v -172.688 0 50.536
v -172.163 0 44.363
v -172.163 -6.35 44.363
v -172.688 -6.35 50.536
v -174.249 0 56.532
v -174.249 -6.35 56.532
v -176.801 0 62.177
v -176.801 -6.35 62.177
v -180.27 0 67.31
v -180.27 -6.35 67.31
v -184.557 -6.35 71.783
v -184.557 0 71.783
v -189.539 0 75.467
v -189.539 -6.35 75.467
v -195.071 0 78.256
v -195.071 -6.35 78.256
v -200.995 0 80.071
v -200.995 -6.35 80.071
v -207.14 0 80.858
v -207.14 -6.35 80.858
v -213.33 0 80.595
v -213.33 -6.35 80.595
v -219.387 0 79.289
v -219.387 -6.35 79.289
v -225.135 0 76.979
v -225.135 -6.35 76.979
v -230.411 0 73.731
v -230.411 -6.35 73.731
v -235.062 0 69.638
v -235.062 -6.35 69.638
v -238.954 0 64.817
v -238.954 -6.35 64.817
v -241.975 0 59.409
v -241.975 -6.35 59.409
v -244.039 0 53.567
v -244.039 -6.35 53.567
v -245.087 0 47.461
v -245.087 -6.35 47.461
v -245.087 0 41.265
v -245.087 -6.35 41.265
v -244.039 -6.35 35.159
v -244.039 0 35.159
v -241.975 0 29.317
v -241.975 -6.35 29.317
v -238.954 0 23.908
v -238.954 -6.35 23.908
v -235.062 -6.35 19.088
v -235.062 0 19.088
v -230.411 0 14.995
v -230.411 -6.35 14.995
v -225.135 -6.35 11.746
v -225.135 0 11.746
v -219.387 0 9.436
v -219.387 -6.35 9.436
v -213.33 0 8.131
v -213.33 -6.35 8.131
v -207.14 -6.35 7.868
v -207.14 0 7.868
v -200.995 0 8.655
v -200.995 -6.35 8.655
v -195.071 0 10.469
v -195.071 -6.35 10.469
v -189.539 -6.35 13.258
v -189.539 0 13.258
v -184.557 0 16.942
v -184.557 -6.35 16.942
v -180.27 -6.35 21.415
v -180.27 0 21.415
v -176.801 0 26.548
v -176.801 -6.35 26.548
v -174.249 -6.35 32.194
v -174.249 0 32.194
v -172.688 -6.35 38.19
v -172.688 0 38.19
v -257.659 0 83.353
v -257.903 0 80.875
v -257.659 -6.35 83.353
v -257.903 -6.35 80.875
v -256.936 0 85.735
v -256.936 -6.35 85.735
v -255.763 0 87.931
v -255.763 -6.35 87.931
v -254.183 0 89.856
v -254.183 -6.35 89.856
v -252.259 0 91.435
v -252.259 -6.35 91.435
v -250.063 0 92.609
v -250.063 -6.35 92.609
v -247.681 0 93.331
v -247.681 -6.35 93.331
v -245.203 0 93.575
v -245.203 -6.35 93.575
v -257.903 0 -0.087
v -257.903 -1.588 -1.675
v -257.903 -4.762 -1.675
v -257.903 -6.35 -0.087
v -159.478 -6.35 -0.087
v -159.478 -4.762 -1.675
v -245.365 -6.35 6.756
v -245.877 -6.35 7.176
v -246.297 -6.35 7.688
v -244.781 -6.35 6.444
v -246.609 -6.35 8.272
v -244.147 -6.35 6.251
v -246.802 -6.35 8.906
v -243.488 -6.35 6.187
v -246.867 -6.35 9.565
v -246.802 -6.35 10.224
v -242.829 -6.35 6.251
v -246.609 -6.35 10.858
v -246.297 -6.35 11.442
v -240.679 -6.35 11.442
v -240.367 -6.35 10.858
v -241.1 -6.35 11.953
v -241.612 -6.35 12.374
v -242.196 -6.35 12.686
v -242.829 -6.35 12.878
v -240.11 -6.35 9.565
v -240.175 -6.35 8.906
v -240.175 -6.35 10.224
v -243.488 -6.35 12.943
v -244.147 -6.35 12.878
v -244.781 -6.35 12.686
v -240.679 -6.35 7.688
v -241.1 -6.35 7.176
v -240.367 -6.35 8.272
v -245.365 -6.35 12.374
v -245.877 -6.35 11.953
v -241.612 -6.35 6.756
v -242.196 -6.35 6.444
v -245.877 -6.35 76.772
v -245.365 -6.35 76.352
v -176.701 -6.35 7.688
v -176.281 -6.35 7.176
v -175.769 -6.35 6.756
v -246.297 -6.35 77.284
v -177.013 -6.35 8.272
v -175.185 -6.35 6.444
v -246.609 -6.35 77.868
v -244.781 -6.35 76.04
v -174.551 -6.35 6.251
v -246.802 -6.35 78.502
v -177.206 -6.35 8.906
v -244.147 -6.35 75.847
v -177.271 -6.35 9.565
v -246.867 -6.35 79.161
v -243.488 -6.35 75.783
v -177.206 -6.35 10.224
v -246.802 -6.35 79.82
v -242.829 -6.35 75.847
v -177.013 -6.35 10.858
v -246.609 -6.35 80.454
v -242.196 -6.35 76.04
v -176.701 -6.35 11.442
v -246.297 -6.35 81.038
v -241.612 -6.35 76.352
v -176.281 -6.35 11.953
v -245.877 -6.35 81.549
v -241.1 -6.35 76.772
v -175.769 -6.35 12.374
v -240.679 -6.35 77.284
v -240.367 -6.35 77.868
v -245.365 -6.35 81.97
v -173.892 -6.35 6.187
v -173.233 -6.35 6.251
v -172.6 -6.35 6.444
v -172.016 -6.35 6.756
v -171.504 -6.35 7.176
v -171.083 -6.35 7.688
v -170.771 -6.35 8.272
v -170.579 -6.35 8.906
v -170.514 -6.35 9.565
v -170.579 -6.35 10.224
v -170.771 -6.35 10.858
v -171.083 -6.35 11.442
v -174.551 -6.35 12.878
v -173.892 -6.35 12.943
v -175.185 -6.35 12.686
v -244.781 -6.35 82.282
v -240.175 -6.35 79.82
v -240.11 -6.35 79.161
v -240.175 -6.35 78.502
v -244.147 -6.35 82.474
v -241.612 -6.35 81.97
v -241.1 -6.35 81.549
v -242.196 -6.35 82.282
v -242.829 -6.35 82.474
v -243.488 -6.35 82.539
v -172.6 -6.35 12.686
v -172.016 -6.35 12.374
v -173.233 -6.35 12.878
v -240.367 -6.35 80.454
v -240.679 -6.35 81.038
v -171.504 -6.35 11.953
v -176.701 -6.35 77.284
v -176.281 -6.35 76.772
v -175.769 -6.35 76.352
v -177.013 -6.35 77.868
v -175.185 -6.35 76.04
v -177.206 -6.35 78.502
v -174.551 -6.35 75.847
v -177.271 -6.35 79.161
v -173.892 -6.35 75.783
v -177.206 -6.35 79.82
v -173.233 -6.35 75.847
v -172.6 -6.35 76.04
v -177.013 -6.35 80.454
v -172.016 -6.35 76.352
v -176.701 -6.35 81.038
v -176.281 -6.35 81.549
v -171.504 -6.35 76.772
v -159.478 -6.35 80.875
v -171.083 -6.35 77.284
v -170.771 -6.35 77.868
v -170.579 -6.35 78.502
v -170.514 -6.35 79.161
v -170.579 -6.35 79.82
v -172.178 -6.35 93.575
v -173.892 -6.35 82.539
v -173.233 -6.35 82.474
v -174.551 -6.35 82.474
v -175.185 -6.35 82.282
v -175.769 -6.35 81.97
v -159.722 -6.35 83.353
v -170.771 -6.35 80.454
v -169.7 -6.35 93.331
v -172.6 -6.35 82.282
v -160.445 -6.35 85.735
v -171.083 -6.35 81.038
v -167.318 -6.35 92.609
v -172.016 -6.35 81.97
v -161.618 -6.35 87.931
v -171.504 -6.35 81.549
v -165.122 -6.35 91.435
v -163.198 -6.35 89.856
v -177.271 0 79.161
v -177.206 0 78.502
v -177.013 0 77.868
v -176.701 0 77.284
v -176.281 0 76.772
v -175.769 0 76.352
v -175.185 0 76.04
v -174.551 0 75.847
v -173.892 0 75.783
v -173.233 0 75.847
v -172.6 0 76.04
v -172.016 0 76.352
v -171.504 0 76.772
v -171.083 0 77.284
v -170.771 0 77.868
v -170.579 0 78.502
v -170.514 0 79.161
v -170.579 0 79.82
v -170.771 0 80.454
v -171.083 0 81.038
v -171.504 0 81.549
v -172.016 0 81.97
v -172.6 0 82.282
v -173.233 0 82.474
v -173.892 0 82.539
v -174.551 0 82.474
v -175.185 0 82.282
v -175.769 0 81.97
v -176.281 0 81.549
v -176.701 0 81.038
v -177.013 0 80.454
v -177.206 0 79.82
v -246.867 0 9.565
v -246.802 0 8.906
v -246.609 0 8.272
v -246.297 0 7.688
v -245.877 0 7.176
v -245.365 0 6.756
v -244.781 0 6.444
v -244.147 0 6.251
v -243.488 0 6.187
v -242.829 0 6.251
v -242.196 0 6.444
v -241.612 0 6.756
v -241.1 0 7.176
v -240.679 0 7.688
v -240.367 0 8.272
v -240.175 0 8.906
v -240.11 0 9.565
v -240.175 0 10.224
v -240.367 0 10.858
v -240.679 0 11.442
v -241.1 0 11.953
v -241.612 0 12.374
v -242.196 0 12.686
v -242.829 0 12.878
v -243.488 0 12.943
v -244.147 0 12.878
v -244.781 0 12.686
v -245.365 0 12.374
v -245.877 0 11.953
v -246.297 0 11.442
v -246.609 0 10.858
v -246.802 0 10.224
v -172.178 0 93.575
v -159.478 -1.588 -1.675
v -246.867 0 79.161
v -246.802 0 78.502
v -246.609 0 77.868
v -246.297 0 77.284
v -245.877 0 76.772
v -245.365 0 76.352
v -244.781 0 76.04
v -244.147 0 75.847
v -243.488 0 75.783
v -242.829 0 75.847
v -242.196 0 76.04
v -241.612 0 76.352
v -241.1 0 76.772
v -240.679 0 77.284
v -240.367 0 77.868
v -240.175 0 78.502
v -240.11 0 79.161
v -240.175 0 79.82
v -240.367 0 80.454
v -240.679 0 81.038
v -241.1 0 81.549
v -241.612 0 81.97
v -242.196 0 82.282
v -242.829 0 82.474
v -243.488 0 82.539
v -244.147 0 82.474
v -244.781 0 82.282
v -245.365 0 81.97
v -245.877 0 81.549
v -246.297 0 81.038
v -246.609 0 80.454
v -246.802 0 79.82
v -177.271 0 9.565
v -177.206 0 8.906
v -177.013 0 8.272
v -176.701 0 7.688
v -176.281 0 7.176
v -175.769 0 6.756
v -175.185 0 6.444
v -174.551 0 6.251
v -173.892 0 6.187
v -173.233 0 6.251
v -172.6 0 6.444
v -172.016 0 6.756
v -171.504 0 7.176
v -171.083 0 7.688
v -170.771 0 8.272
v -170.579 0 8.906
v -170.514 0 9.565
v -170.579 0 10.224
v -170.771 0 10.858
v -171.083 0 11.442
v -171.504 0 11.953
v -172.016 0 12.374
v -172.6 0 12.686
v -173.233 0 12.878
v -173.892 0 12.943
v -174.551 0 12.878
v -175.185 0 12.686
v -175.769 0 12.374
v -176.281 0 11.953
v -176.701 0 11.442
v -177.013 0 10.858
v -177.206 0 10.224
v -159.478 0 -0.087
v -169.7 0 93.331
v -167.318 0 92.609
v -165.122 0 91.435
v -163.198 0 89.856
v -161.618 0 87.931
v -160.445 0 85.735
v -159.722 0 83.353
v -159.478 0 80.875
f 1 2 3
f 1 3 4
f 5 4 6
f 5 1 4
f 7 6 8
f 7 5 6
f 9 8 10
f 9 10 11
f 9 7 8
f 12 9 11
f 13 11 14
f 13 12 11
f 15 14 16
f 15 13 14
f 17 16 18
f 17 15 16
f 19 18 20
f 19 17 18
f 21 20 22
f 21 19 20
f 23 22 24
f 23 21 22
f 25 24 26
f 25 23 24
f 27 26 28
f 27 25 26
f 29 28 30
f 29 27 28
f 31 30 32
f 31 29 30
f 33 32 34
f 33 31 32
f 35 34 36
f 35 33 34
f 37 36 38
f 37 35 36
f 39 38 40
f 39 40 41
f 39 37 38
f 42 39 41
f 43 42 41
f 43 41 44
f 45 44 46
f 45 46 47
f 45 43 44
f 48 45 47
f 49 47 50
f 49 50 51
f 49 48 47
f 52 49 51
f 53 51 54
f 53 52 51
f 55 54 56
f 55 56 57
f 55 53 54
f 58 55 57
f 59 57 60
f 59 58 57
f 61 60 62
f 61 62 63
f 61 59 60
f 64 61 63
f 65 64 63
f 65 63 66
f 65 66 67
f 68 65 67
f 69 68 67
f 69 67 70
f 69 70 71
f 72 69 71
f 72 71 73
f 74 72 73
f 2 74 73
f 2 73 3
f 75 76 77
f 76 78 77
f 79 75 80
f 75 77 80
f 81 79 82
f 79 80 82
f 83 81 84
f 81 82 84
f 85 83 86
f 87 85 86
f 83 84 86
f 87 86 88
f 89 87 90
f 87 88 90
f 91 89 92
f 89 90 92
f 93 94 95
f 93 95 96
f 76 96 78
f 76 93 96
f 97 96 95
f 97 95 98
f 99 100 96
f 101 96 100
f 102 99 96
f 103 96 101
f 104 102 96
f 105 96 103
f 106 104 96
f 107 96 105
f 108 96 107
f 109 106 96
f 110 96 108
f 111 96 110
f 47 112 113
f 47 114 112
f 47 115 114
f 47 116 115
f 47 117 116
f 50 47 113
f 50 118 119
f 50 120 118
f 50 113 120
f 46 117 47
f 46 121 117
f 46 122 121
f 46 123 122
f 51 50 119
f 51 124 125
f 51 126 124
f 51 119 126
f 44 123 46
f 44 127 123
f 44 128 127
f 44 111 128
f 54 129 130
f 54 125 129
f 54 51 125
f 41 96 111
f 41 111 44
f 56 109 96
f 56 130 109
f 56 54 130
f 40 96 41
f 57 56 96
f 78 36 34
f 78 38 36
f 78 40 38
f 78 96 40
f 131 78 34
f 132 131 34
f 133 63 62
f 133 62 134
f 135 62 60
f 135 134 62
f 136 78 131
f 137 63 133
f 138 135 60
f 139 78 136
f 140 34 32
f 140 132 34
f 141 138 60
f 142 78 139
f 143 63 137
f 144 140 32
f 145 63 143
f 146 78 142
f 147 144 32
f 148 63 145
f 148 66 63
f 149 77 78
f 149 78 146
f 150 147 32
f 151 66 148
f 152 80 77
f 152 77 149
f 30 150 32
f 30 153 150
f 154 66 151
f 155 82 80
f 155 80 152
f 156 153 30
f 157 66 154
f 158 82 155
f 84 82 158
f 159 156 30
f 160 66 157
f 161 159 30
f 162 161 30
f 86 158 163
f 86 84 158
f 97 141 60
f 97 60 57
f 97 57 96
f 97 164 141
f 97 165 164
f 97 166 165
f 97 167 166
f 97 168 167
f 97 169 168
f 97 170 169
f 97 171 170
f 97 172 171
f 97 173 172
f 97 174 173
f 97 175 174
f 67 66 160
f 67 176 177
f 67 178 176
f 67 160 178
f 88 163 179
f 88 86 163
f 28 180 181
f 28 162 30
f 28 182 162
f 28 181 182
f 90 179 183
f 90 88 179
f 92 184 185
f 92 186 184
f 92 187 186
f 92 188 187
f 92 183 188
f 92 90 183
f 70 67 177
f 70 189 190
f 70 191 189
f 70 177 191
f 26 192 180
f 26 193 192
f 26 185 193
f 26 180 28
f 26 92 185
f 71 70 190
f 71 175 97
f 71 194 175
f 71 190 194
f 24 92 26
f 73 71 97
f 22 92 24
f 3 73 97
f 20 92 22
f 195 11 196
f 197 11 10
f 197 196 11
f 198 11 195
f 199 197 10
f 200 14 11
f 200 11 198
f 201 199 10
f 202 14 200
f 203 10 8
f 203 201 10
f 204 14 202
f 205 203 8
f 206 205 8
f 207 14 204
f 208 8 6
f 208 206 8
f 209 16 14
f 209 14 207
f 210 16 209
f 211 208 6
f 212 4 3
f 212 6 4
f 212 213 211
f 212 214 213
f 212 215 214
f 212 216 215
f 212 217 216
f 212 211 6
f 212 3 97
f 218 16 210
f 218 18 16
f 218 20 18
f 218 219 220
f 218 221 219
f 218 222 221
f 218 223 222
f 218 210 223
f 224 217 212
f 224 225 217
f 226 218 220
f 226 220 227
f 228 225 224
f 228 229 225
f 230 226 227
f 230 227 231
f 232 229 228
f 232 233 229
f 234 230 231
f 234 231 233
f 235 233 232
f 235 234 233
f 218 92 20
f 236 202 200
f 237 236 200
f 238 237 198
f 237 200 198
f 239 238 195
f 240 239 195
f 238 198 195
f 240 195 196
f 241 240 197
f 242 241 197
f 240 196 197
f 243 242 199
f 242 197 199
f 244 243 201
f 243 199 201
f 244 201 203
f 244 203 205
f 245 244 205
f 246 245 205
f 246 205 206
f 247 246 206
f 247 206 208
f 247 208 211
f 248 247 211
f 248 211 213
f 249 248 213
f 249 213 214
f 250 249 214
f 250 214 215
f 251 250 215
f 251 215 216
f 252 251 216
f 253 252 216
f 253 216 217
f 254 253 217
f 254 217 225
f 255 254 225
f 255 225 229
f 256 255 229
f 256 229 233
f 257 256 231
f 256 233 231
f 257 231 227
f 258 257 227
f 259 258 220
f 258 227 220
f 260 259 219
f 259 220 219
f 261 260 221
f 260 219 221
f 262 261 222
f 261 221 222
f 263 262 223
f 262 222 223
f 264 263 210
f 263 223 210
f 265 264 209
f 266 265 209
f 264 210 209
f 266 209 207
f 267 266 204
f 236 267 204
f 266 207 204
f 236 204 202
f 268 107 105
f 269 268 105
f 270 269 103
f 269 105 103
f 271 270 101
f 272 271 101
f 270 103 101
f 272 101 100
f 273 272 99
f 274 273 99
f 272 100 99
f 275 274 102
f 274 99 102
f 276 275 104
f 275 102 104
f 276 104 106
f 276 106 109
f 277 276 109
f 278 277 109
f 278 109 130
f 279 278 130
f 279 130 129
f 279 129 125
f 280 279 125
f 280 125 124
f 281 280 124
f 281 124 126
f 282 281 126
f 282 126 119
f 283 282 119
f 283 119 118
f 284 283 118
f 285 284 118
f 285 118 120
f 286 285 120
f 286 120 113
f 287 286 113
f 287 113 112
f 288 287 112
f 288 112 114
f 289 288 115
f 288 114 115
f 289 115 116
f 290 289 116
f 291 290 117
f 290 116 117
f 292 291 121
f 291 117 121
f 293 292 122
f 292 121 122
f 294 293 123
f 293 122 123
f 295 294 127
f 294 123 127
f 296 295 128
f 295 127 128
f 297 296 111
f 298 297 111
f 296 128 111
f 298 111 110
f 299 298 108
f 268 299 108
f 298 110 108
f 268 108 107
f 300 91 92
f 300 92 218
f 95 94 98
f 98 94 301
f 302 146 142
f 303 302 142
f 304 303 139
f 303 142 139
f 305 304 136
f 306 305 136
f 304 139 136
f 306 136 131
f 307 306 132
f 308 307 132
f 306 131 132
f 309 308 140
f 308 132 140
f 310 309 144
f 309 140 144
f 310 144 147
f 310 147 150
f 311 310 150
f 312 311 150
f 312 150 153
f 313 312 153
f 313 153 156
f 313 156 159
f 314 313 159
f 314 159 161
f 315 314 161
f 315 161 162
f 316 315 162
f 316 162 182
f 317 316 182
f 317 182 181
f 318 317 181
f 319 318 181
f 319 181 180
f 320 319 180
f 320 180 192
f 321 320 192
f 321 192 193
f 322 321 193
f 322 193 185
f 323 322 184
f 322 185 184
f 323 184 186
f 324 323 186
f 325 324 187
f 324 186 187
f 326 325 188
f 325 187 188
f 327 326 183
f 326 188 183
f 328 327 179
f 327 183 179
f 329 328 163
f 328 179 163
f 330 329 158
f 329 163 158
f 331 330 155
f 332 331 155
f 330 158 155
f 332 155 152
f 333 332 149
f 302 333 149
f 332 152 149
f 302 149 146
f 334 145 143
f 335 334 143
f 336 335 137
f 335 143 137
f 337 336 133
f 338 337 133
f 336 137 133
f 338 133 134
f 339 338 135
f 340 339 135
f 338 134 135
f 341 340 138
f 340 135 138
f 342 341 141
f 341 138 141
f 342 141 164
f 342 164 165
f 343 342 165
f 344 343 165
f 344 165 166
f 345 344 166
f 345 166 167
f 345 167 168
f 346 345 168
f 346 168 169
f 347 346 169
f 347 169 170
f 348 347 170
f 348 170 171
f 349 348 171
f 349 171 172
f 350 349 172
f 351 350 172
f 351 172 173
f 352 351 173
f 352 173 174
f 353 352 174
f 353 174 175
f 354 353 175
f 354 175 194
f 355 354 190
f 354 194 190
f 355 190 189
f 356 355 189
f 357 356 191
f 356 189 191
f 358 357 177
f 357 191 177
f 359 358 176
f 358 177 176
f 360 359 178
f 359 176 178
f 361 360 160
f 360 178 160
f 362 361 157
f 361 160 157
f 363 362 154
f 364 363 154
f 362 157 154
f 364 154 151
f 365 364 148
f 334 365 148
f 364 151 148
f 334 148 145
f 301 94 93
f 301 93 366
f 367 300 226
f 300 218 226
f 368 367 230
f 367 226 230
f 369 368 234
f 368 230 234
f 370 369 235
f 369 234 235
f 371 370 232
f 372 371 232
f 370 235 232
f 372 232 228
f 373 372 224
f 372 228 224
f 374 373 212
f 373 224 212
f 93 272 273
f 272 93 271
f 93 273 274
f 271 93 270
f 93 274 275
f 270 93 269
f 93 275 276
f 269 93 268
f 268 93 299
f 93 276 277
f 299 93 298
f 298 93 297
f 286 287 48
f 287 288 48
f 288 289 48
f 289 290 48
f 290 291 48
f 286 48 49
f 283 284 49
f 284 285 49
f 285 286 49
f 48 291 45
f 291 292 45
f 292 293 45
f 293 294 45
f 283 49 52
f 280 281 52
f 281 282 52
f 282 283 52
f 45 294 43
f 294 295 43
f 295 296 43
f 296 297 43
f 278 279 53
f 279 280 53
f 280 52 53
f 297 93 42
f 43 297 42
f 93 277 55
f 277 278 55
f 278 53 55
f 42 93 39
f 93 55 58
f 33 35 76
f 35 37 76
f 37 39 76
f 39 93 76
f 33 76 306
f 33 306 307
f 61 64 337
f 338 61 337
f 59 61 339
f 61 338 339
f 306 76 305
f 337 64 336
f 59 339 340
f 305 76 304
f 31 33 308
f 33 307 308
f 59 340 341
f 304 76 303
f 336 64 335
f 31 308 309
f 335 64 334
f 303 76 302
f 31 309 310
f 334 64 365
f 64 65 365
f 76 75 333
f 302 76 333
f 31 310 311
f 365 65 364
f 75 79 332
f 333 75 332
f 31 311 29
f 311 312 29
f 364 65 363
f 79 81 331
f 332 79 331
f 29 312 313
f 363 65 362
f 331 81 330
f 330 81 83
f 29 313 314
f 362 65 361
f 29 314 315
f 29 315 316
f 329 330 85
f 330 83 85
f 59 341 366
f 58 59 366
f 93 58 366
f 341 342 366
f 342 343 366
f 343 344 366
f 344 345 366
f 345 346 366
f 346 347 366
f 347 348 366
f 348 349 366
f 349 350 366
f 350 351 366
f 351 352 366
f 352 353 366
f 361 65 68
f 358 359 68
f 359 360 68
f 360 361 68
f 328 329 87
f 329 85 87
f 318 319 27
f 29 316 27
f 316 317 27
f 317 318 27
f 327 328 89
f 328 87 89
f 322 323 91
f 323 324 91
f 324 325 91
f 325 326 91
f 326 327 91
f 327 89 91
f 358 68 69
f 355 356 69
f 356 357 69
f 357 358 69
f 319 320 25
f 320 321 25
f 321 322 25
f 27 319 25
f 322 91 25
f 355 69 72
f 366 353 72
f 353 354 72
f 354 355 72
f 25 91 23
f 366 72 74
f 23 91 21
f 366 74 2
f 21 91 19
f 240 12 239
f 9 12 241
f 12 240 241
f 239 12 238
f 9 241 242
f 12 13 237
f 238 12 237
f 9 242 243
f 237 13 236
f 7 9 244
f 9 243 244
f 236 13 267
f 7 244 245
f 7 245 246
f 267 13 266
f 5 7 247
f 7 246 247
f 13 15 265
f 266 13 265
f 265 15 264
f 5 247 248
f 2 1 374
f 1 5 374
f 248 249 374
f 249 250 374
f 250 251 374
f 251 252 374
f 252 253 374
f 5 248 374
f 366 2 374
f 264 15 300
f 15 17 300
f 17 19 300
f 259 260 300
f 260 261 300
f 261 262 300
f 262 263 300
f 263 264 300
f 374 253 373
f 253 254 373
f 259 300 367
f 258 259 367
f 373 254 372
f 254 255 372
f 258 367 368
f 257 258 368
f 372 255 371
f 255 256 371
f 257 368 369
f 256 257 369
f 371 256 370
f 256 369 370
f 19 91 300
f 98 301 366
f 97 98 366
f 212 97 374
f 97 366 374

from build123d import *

# Parameters (mm, degrees)
F1_W     = 98.425
F1_H     = 95.25
F1_R     = 36.52774
F2_DEPTH = 6.35
F3_R     = 12.7
F4_SIZE  = 1.5875
F5_D     = 6.7564


# Not quite as in the source:
# - a feature names something its author has since deleted; it is built from what else it names


with BuildPart() as f2:
    # F1 (on face) → F2 (new body)
    with BuildSketch(Plane.XZ):
        with Locations((-208.6903624, 45.950251)):
            Rectangle(F1_W, F1_H)
        Polygon((-169.1837104, 87.1821218), (-168.4475168, 87.1002576), (-167.7522426, 86.8546396), (-167.0979132, 86.4459282), (-166.6073376, 85.9140776), (-165.944296, 85.3010232), (-165.6990082, 84.6054442), (-165.617144, 83.8692252), (-165.617144, 4.8562514), (-165.6990082, 4.1200578), (-165.944296, 3.4251392), (-166.6073376, 2.811399), (-167.0979132, 2.2795484), (-167.7522426, 1.9114516), (-168.4475168, 1.666494), (-169.1837104, 1.5846298), (-248.1557394, 1.5846298), (-248.8919584, 1.666494), (-249.5872072, 1.9114516), (-250.2415366, 2.2795484), (-250.9864424, 2.811399), (-251.395484, 3.4251392), (-251.6407718, 4.1200578), (-251.7226614, 4.8562514), (-251.7226614, 83.8692252), (-251.6407718, 84.6054442), (-251.395484, 85.3010232), (-250.9864424, 85.9140776), (-250.2415366, 86.4459282), (-249.5872072, 86.8546396), (-248.8919584, 87.1002576), (-248.1557394, 87.1821218), align=None, mode=Mode.SUBTRACT)
        Polygon((-167.7522426, 86.8546396), (-168.4475168, 87.1002576), (-169.1837104, 87.1821218), (-248.1557394, 87.1821218), (-248.8919584, 87.1002576), (-249.5872072, 86.8546396), (-250.2415366, 86.4459282), (-250.9864424, 85.9140776), (-251.395484, 85.3010232), (-251.6407718, 84.6054442), (-251.7226614, 83.8692252), (-251.7226614, 4.8562514), (-251.6407718, 4.1200578), (-251.395484, 3.4251392), (-250.9864424, 2.811399), (-250.2415366, 2.2795484), (-249.5872072, 1.9114516), (-248.8919584, 1.666494), (-248.1557394, 1.5846298), (-169.1837104, 1.5846298), (-168.4475168, 1.666494), (-167.7522426, 1.9114516), (-167.0979132, 2.2795484), (-166.6073376, 2.811399), (-165.944296, 3.4251392), (-165.6990082, 4.1200578), (-165.617144, 4.8562514), (-165.617144, 83.8692252), (-165.6990082, 84.6054442), (-165.944296, 85.3010232), (-166.6073376, 85.9140776), (-167.0979132, 86.4459282), align=None)
        with Locations((-208.6903624, 44.362751)):
            Circle(F1_R, mode=Mode.SUBTRACT)
    extrude(amount=F2_DEPTH)

    # F3
    f3_edges = [f2.edges().sort_by_distance(p)[0] for p in [
        (-257.902862, -3.175, 93.575251),
        (-159.477862, -3.175, 93.575251),
    ]]
    fillet(f3_edges, radius=F3_R)

    # F4
    f4_edges = [f2.edges().sort_by_distance(p)[0] for p in [
        (-208.690362, 0, -1.674749),
        (-208.690362, -6.35, -1.674749),
    ]]
    chamfer(f4_edges, length=F4_SIZE)

    # F5 (through all)
    with Locations(Plane(origin=(0, 0, 0), x_dir=(1, 0, 0), z_dir=(0, 1, 0))):
        with Locations((-243.4883624, -79.160751), (-173.8923624, -79.160751), (-173.8923624, -9.564751), (-243.4883624, -9.564751)):
            Hole(F5_D / 2)


solid = f2.part
